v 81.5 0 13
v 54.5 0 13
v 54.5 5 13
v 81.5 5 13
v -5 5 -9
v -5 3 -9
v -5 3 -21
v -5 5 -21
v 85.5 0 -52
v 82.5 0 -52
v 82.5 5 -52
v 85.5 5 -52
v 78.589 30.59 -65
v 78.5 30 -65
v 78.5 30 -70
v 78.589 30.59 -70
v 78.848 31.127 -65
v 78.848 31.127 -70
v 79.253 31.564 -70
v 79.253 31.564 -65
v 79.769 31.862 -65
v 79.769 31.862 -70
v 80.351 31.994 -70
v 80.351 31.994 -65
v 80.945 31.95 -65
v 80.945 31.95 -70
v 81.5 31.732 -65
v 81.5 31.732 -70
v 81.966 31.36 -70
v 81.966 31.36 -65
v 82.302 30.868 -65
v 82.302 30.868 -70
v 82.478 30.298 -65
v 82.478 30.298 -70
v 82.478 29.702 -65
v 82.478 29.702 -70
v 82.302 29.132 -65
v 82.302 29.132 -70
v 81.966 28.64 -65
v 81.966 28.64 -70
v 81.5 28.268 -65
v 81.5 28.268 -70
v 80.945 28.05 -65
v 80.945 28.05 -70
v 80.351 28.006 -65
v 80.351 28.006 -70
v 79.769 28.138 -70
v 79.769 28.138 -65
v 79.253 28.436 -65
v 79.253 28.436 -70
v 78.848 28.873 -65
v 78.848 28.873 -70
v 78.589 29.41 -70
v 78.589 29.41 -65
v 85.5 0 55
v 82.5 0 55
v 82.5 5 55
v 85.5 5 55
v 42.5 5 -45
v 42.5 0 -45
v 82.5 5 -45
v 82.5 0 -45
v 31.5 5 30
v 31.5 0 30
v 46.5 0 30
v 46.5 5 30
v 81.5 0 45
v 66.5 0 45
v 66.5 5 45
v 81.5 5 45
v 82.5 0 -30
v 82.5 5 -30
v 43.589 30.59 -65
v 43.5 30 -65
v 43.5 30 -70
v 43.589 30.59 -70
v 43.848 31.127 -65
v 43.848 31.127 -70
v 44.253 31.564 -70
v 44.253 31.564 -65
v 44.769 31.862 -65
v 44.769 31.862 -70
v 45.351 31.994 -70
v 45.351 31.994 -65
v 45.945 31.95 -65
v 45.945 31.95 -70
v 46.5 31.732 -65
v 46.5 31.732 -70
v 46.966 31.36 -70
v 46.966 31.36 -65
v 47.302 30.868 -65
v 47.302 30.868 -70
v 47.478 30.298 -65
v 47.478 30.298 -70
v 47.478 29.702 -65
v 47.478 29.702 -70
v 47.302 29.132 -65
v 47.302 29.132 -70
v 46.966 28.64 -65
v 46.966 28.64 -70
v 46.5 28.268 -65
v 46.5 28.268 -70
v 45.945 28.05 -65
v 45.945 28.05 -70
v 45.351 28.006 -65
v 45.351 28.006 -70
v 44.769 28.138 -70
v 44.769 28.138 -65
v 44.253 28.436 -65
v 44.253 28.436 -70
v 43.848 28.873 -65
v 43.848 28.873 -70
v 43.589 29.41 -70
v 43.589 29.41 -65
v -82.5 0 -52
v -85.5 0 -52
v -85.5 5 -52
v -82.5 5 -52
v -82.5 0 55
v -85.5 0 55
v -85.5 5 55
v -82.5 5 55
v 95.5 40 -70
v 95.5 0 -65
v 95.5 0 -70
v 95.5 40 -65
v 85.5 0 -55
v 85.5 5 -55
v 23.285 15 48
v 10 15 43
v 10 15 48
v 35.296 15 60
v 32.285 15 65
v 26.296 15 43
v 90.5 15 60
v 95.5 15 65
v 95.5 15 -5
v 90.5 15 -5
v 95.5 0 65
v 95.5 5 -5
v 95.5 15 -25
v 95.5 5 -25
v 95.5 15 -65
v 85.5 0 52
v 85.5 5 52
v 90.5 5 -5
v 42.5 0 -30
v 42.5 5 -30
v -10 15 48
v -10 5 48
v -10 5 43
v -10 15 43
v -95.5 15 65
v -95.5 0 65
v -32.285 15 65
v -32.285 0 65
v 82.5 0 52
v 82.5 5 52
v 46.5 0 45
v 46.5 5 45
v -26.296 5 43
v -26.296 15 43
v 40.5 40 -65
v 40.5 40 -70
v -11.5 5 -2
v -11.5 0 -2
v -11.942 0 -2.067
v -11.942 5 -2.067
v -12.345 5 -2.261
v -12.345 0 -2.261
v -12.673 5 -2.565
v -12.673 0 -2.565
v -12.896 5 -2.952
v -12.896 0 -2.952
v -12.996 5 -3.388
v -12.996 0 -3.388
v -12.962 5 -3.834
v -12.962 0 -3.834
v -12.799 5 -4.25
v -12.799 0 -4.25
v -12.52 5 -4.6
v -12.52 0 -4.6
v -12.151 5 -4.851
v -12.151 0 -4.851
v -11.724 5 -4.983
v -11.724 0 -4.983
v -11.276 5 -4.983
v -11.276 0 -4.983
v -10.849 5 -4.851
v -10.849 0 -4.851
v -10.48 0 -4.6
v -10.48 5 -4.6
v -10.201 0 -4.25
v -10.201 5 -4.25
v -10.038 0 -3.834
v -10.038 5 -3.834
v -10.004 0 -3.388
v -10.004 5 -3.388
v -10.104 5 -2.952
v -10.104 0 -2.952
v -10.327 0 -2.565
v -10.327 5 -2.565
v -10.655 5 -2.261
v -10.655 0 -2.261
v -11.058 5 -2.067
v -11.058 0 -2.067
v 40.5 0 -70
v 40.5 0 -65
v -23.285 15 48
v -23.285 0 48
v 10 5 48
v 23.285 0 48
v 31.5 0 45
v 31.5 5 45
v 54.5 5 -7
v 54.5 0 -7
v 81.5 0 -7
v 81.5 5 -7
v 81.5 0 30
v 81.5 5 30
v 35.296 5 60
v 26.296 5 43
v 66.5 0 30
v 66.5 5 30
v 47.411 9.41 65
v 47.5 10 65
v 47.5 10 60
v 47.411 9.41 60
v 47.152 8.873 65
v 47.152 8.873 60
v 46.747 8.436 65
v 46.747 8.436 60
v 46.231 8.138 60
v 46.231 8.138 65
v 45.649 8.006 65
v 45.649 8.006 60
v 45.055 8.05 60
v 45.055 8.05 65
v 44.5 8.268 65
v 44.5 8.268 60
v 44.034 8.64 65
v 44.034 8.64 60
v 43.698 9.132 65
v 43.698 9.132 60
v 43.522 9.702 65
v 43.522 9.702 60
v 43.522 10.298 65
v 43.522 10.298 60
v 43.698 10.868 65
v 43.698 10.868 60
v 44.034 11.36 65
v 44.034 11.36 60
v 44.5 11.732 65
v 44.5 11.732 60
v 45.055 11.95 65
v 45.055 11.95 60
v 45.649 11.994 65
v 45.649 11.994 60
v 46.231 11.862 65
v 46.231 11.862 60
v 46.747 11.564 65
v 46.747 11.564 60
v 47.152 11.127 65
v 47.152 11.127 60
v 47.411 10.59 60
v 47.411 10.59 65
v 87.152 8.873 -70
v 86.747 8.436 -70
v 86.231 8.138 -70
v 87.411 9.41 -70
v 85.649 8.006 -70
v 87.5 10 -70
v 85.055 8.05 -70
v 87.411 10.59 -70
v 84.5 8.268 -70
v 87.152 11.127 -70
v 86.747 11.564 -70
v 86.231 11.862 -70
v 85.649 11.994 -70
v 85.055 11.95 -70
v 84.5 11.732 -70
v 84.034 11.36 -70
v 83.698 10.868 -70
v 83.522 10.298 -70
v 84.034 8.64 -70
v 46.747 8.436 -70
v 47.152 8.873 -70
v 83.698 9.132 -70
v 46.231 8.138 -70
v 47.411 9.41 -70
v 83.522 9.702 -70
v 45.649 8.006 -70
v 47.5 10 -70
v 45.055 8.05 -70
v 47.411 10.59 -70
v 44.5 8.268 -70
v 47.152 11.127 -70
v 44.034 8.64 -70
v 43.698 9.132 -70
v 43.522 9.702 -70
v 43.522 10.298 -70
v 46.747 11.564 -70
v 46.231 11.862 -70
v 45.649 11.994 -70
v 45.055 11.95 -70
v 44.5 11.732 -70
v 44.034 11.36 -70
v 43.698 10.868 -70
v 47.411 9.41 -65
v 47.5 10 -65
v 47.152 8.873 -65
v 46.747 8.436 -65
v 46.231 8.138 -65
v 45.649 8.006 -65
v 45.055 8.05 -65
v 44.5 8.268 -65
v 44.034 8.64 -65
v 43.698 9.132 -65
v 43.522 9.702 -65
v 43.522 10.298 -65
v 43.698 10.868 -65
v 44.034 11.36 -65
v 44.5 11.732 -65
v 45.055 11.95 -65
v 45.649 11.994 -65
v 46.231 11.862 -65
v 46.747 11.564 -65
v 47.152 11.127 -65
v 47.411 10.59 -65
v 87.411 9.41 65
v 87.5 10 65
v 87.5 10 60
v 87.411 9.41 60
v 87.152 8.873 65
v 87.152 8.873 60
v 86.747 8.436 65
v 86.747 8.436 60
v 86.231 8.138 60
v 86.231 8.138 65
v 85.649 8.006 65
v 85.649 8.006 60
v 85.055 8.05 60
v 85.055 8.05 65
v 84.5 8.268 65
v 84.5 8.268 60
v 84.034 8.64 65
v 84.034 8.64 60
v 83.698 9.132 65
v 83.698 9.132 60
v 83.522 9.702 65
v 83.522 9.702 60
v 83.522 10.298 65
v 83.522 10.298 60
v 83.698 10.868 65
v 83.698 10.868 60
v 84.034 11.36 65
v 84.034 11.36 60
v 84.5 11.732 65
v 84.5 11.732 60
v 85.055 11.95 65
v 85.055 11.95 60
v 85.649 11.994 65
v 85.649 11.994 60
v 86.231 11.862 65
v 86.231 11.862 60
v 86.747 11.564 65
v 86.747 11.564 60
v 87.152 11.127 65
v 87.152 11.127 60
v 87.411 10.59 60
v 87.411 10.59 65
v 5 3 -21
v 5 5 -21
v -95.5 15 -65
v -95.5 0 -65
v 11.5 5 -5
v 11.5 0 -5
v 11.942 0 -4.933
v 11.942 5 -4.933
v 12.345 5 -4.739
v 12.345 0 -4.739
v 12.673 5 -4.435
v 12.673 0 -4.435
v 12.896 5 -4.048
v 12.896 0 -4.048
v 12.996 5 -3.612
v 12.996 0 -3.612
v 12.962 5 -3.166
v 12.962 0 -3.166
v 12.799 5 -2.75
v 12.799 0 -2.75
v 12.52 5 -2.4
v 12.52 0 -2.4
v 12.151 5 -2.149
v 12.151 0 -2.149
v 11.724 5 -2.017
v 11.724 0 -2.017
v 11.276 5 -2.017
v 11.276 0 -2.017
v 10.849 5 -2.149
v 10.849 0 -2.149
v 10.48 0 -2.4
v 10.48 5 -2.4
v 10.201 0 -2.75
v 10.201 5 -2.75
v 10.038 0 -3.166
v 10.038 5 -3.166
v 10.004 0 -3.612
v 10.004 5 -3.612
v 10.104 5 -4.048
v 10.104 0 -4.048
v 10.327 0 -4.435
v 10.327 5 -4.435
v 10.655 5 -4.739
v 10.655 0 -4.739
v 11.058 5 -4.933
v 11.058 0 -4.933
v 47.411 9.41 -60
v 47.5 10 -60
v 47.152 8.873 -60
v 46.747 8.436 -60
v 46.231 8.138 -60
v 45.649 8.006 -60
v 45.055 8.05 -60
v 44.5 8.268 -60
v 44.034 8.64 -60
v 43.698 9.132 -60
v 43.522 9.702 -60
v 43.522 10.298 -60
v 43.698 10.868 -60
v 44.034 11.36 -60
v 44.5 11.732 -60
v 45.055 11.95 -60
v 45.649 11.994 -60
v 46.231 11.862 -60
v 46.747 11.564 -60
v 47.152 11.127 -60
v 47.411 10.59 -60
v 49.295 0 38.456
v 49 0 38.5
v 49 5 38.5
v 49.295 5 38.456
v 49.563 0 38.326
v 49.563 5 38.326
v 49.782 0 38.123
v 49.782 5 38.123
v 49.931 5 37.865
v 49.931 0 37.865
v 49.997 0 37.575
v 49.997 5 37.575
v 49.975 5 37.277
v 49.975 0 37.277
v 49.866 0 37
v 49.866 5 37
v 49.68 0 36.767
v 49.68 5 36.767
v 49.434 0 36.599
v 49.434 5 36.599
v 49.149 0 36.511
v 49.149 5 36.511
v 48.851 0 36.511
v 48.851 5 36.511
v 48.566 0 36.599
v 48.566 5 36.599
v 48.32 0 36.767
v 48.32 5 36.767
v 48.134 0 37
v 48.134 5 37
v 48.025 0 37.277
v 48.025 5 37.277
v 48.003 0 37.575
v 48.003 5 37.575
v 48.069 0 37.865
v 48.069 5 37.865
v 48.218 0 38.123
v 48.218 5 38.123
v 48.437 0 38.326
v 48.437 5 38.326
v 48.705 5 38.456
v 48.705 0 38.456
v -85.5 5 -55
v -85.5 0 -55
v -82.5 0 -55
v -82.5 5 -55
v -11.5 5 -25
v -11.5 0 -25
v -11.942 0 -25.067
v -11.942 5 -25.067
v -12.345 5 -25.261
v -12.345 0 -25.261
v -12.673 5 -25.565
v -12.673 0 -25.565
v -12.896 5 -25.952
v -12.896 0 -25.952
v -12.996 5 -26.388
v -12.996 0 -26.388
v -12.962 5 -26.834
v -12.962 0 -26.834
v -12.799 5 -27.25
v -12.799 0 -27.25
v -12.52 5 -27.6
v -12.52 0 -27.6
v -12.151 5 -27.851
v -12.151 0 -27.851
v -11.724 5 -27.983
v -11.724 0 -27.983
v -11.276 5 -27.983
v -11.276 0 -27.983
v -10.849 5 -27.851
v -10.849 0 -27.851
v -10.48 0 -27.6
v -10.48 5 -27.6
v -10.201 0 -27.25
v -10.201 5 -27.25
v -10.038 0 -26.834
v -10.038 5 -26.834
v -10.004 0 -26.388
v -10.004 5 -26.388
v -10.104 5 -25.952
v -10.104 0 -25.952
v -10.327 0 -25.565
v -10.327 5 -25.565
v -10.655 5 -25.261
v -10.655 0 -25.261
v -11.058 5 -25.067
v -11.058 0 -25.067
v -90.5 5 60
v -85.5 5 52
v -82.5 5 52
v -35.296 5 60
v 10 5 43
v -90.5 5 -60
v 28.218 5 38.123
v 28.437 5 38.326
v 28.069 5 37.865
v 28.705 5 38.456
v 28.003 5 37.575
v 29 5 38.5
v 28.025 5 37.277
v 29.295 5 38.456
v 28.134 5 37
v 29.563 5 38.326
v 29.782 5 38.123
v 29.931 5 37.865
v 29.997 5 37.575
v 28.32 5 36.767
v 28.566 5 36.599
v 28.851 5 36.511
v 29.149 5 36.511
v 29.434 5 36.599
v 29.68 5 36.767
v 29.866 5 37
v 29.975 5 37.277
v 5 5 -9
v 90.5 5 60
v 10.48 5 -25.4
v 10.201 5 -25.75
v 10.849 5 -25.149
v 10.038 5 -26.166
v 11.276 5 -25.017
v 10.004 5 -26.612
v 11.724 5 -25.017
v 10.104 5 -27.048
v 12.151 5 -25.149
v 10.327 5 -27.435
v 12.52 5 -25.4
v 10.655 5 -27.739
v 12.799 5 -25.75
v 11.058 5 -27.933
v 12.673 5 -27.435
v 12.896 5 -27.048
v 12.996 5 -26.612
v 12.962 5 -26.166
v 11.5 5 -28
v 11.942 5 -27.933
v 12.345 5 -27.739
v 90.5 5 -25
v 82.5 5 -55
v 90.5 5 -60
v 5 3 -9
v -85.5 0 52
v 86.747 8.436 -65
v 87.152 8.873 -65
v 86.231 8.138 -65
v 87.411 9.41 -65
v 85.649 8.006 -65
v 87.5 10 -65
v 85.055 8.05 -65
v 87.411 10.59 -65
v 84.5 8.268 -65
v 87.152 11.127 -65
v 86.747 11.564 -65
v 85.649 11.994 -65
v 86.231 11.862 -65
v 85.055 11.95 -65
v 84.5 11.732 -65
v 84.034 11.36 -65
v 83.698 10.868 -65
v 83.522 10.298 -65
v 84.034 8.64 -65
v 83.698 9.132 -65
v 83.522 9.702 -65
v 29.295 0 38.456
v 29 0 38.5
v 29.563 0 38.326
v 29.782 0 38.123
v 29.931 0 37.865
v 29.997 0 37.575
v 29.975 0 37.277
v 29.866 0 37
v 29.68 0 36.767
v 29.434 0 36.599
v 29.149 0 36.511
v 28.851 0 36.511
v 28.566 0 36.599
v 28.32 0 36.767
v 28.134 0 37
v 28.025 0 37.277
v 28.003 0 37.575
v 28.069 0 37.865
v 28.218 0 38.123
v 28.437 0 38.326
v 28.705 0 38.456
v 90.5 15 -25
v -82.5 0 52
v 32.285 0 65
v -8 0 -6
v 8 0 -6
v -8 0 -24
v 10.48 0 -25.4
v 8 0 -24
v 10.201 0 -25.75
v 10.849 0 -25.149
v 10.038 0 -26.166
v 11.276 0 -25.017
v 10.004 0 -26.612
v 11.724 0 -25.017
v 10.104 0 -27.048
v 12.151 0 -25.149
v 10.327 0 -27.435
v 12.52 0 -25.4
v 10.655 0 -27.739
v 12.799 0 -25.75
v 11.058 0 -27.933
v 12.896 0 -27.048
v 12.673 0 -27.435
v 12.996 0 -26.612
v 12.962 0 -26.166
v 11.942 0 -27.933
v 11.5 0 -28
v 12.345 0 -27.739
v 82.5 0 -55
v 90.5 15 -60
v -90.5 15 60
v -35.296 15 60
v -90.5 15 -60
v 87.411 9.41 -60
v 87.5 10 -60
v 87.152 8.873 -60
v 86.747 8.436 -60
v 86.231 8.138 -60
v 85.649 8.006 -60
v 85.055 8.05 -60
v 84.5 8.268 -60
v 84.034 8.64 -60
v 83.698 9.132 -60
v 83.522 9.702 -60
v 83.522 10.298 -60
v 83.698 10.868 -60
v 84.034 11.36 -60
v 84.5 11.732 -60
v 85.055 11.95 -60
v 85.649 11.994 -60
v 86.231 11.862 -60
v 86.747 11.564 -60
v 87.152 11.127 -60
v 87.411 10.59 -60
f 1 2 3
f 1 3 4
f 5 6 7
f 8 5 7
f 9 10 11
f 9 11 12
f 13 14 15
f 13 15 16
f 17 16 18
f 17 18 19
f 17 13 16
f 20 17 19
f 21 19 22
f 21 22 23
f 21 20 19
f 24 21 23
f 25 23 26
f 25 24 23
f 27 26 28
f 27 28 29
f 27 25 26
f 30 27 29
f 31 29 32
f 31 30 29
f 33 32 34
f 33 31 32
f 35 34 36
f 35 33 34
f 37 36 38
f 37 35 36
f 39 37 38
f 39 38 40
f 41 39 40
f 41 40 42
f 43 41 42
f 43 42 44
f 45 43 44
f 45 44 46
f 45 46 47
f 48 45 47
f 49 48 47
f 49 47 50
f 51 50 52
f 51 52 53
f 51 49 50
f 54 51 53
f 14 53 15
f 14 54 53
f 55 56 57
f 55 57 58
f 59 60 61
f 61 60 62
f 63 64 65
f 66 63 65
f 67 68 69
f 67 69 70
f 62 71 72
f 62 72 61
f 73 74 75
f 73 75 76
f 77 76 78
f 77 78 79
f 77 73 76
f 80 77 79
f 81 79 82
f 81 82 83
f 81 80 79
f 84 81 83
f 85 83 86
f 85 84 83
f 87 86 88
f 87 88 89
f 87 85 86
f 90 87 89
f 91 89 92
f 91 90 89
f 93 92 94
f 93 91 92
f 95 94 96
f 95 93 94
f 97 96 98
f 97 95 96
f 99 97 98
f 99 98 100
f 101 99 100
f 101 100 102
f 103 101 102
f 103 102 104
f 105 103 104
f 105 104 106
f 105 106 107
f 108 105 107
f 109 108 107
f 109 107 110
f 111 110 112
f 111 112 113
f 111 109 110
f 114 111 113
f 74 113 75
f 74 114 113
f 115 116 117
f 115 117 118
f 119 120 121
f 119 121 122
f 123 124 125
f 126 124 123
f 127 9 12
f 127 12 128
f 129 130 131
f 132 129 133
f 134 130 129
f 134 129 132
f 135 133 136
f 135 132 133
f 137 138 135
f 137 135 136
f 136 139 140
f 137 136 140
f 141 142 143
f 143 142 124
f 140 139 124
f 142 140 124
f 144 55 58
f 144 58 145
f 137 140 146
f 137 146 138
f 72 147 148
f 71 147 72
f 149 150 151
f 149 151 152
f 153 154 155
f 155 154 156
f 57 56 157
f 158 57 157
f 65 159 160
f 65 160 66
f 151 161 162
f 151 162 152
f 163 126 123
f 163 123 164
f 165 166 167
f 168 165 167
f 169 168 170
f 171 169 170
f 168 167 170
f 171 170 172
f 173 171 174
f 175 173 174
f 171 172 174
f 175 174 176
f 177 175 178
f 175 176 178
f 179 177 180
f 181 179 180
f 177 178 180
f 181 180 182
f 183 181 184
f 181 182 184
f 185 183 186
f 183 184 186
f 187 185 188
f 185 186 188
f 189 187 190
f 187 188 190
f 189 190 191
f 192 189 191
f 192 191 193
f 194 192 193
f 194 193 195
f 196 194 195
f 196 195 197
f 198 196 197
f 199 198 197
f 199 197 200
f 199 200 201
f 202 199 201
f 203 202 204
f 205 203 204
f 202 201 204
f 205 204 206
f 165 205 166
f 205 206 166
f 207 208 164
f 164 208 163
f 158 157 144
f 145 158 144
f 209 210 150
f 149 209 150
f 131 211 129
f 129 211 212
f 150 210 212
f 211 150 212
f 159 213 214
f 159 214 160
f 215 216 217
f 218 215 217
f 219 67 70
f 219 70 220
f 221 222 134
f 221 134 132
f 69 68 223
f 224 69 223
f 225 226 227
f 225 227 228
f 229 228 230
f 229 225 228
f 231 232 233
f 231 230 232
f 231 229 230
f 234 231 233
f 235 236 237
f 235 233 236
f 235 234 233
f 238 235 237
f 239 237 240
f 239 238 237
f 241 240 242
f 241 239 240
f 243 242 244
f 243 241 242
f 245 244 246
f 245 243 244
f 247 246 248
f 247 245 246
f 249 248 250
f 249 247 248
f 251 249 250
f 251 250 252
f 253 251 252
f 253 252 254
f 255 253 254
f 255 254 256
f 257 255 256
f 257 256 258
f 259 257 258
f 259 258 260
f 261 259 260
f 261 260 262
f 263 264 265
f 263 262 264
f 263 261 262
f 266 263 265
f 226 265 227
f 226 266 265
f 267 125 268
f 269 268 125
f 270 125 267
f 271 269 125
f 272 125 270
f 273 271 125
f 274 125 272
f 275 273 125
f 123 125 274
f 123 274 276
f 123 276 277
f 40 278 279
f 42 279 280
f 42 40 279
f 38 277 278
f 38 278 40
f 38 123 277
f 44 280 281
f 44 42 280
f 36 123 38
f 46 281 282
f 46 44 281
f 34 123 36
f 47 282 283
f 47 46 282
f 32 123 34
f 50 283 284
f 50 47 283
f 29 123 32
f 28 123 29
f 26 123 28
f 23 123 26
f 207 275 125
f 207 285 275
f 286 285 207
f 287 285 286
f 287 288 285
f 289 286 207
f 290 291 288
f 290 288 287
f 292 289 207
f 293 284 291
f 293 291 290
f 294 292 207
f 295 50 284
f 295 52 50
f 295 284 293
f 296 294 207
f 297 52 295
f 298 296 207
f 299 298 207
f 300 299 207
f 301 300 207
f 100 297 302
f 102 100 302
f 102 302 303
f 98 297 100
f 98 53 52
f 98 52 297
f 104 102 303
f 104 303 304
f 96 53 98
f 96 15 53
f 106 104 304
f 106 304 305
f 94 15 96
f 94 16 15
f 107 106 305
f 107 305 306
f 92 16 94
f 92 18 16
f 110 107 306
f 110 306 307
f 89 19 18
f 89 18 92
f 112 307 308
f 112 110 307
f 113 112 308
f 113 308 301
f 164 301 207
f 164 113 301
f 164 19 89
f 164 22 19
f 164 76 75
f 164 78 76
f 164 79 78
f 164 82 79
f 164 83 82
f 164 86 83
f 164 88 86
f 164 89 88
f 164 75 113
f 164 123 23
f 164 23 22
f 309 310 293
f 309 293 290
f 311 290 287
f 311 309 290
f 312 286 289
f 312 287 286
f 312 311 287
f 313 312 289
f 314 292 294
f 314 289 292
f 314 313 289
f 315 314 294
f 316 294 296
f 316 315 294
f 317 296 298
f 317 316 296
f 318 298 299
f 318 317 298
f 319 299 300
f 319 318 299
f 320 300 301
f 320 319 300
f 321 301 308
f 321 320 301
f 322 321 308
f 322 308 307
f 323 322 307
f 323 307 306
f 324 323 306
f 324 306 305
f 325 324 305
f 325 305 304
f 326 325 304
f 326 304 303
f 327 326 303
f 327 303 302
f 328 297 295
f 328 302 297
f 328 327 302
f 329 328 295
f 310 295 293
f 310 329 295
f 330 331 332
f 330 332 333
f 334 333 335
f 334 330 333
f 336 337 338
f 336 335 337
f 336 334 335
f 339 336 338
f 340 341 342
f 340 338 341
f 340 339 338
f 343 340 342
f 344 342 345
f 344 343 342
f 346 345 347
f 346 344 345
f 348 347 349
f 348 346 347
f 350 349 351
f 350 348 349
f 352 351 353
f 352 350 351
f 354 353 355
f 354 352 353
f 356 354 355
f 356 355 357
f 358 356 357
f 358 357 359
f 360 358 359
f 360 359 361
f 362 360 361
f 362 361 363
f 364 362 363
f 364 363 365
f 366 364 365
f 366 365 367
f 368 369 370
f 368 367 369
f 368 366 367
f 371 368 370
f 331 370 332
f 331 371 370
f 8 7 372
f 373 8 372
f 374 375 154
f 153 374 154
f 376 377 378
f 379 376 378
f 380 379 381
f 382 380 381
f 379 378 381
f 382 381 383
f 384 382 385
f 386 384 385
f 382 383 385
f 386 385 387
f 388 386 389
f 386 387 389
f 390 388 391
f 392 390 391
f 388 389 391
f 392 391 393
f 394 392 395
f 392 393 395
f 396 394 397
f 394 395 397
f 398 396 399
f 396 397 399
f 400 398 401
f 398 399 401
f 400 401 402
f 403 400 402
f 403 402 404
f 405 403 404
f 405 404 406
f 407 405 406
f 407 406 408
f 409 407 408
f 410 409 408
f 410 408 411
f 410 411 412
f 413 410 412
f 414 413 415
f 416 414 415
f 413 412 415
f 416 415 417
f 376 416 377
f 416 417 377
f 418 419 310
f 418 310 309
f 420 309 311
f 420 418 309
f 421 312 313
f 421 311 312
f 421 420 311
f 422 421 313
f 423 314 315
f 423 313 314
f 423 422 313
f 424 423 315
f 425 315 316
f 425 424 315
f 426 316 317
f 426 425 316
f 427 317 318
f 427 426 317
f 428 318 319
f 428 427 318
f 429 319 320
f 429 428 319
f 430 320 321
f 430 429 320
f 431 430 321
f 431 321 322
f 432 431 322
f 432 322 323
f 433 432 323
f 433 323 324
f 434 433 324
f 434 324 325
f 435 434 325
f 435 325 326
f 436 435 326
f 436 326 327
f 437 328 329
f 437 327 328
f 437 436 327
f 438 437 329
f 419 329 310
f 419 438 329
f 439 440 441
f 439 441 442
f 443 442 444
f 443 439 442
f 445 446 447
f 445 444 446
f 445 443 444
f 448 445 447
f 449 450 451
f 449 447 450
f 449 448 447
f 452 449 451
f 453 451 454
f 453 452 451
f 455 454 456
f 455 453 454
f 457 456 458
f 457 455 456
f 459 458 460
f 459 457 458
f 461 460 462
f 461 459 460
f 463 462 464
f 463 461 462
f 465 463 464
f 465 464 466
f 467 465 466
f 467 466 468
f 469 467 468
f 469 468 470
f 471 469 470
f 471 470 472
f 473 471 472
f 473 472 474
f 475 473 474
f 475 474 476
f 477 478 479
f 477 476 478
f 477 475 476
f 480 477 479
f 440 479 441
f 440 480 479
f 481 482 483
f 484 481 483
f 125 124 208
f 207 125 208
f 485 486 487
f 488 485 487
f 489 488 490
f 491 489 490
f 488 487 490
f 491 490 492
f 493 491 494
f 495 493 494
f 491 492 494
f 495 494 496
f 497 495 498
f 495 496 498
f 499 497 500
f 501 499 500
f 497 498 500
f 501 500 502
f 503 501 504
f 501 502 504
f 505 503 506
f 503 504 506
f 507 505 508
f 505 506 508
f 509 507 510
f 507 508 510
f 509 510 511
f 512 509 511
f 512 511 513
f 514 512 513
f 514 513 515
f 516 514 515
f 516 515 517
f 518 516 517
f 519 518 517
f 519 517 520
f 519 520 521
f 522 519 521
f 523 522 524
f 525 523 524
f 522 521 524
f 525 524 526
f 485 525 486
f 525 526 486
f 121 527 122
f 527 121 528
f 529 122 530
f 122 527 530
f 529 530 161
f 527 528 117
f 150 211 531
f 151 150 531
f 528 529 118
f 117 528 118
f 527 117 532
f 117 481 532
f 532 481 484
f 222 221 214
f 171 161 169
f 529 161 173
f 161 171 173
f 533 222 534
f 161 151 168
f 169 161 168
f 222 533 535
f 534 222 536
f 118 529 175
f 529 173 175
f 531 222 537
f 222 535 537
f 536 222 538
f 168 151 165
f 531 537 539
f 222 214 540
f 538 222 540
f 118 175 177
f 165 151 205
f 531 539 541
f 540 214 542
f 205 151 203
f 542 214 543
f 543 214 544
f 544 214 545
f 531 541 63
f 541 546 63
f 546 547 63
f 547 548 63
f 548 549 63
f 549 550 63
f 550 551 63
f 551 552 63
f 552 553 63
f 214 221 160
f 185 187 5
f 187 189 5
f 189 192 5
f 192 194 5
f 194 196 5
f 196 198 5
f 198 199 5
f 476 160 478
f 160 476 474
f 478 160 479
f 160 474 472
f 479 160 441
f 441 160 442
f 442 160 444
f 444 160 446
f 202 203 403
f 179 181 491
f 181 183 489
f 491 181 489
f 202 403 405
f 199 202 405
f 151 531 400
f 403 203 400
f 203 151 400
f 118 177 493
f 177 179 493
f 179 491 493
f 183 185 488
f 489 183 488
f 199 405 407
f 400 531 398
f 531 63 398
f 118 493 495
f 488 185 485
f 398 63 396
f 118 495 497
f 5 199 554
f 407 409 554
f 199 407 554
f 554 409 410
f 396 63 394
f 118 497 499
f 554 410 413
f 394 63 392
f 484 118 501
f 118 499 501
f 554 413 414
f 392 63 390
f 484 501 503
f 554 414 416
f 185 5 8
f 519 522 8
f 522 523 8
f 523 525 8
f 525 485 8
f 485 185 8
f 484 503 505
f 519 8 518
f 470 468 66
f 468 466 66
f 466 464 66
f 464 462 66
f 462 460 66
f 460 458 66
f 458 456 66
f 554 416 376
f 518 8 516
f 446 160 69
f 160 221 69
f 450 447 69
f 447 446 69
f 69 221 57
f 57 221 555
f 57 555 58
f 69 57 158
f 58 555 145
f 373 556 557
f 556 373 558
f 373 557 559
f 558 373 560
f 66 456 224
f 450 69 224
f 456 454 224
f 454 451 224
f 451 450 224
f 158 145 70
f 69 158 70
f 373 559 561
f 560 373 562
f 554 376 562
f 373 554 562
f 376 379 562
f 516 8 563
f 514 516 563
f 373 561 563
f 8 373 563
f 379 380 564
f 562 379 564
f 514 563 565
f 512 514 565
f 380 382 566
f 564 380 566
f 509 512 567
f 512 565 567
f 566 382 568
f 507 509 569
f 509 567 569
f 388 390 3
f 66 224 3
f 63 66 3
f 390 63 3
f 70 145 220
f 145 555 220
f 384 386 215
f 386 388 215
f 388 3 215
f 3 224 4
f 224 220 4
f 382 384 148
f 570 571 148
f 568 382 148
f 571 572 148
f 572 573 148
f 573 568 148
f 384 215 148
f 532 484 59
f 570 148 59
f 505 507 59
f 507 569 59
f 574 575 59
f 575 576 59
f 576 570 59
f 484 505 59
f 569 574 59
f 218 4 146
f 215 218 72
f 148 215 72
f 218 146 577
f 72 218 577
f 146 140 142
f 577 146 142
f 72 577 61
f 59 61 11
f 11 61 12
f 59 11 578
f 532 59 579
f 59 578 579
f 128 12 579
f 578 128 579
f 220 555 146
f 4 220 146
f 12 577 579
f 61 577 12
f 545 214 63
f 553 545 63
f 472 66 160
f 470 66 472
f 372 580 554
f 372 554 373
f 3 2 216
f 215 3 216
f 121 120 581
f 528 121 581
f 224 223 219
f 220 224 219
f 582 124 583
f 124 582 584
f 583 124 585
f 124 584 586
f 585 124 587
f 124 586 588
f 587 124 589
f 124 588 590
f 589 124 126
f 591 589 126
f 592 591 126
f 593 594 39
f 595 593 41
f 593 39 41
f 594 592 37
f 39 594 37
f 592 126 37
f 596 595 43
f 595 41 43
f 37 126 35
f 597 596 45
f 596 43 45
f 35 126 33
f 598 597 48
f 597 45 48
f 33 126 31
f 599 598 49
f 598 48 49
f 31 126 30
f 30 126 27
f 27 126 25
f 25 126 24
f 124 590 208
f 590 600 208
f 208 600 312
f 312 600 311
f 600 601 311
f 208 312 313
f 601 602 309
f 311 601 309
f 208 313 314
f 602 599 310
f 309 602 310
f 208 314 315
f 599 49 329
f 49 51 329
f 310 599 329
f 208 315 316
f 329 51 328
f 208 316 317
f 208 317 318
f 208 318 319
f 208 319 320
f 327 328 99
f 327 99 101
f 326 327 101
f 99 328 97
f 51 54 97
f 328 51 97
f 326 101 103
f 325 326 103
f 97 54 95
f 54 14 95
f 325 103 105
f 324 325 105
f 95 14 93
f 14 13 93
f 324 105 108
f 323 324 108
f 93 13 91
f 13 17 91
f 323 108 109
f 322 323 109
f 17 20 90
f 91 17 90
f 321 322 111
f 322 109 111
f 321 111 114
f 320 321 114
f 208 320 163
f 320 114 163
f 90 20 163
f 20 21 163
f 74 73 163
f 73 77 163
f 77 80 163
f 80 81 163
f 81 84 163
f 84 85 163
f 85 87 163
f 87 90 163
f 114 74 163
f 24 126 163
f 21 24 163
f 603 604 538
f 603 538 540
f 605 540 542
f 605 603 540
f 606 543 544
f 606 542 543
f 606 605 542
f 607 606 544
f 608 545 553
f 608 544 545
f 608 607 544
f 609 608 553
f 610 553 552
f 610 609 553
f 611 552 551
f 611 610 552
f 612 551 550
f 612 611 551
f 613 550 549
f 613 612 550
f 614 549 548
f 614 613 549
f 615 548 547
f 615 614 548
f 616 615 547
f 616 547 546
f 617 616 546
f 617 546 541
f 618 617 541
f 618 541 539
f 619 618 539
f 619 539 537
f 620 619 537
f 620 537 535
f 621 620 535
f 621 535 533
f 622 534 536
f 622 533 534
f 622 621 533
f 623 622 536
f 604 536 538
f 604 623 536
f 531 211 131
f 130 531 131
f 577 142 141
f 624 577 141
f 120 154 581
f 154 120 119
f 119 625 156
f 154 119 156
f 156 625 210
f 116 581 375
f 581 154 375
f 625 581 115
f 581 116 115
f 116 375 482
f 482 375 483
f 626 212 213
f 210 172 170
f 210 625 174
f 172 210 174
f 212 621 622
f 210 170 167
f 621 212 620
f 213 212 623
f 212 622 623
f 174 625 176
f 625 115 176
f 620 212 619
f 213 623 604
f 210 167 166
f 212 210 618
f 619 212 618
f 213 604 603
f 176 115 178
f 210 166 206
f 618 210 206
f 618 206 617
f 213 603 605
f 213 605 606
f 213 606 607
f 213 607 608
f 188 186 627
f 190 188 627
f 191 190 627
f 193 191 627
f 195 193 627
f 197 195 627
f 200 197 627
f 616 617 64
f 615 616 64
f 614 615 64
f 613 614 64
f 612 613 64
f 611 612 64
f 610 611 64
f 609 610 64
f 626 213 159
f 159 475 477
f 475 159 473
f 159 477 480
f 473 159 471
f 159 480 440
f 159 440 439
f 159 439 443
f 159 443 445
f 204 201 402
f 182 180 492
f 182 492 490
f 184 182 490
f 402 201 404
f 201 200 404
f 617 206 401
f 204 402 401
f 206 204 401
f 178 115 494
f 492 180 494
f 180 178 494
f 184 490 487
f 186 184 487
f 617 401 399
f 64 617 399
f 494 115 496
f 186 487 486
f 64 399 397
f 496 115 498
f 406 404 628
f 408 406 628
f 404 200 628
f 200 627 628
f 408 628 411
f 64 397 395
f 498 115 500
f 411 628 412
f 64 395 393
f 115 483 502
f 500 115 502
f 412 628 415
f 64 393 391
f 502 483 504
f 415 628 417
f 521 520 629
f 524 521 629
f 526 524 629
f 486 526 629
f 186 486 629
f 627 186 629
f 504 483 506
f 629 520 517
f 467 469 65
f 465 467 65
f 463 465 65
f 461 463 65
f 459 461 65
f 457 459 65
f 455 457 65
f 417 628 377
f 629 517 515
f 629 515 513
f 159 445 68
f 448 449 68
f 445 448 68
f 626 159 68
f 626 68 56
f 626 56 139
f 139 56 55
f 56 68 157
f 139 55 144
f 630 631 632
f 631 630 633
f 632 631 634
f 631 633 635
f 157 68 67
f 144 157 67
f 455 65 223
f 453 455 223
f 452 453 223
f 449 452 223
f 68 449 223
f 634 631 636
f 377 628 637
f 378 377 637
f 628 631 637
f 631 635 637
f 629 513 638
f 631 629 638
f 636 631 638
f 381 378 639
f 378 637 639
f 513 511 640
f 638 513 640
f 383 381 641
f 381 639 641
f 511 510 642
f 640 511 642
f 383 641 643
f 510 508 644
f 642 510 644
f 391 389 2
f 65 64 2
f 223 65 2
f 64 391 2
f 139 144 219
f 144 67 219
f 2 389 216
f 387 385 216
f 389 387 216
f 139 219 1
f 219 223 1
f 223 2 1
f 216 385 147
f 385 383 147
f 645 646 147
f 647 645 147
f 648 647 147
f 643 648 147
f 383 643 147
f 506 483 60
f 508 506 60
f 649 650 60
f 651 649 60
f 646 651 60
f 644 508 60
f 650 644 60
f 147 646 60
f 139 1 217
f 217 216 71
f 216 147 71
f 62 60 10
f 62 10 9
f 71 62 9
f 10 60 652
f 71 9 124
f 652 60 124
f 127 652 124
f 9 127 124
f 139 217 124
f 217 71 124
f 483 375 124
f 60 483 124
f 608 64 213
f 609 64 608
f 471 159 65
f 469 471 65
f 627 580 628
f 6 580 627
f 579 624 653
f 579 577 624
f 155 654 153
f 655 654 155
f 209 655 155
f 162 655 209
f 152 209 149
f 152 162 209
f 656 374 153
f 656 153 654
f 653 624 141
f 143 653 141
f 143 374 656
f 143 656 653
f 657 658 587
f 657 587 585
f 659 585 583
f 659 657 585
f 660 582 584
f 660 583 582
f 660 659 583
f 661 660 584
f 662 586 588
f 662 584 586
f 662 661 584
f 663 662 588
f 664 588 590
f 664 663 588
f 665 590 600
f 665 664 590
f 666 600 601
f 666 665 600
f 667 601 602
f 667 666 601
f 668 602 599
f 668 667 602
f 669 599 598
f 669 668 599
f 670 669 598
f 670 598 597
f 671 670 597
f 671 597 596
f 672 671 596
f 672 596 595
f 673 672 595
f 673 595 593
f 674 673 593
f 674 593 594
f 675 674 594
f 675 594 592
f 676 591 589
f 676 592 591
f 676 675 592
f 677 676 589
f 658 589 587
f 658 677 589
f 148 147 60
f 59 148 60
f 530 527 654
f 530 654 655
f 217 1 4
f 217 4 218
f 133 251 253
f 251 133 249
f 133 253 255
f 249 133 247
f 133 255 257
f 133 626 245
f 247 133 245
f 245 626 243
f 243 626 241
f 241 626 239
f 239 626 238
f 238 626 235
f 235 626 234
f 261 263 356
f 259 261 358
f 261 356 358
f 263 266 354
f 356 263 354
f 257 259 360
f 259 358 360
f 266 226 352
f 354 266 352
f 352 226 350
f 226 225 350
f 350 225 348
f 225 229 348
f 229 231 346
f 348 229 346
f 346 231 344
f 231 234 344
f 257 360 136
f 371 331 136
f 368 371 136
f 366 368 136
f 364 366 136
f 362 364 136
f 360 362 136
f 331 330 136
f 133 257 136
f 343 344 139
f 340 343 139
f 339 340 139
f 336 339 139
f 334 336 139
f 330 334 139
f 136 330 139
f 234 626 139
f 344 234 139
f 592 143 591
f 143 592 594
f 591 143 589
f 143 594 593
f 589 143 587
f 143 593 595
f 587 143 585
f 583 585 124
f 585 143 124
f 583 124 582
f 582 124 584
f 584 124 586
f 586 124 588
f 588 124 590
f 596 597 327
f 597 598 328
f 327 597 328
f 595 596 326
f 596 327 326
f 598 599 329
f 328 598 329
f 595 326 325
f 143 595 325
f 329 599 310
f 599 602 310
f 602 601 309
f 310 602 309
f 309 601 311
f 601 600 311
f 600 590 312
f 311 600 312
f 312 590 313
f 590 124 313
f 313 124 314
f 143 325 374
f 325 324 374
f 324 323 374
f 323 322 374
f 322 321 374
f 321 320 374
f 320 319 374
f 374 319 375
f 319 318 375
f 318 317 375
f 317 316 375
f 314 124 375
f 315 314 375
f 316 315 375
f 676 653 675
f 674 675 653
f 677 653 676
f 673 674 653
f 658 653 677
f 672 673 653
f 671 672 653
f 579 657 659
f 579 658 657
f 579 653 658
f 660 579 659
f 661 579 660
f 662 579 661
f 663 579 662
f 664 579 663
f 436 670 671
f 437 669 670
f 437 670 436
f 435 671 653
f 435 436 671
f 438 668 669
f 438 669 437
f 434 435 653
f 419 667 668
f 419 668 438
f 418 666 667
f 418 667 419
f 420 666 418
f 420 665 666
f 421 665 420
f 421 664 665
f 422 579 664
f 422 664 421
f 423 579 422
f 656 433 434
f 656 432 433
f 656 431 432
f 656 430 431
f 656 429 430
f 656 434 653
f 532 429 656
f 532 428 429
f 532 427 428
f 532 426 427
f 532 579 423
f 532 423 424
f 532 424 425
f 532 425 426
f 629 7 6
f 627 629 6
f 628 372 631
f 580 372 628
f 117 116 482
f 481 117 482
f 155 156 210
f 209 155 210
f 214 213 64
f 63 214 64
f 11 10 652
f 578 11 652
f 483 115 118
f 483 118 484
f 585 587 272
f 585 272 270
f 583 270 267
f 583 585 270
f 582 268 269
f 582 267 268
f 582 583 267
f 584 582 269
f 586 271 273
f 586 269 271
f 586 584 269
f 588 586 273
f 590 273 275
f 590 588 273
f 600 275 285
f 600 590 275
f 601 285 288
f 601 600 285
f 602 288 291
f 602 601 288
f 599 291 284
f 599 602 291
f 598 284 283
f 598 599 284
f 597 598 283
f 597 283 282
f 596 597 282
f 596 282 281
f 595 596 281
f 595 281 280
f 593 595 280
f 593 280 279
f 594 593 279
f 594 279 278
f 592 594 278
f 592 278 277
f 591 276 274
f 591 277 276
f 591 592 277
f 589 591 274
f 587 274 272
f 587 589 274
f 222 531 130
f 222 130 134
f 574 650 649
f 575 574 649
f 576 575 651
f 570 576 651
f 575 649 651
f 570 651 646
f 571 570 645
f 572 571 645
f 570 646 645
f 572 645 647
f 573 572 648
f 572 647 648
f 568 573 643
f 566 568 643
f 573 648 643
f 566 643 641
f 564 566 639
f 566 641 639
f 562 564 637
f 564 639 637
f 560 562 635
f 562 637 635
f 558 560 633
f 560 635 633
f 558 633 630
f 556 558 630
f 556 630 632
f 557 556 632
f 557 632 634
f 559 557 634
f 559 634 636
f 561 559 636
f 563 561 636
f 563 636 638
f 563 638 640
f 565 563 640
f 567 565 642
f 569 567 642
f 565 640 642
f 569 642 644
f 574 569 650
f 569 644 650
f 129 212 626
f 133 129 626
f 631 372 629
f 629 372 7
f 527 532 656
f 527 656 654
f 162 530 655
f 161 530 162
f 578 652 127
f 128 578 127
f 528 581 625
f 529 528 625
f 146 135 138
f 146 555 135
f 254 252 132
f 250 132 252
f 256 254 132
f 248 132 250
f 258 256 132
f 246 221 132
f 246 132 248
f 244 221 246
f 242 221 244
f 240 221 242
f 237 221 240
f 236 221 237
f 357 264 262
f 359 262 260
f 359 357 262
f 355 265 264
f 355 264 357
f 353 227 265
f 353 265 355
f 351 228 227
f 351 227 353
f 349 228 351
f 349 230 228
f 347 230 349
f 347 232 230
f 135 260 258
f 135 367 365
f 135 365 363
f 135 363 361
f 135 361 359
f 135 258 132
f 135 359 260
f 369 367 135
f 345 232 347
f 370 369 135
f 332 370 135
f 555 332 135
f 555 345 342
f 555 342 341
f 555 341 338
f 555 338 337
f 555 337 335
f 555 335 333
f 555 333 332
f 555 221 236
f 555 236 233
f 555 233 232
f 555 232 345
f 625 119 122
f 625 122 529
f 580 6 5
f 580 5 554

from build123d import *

# Parameters (mm, degrees)
BOSS_EXTRUDE2_DEPTH     = 15
SHELL1_T                = -5
CUT_EXTRUDE2_DEPTH      = 117.491415993
CUT_EXTRUDE2_DEPTH_BACK = 117.491415993
SKETCH4_R               = 1
SKETCH4_W               = 10
SKETCH4_H               = 12
SKETCH4_W_2             = 27
SKETCH4_H_2             = 20
SKETCH4_W_3             = 15
SKETCH4_H_3             = 15
SKETCH4_W_4             = 40
SKETCH5_W               = 3
SKETCH5_H               = 3
CUT_EXTRUDE4_DEPTH      = 117.491415993
SKETCH6_W               = 55
SKETCH6_H               = 40
SKETCH6_R               = 2
BOSS_EXTRUDE3_DEPTH     = 5
CUT_EXTRUDE5_DEPTH      = 171.133036181
CUT_EXTRUDE5_DEPTH_BACK = 171.133036181
SKETCH7_R               = 2
CHAMFER2_SIZE           = 3
SKETCH10_R              = 1.5
CUT_EXTRUDE6_DEPTH      = 5
SKETCH11_W              = 20
SKETCH11_H              = 10
CUT_EXTRUDE7_DEPTH      = 5
SKETCH12_W              = 20
SKETCH12_H              = 15
CUT_EXTRUDE8_DEPTH      = 6


with BuildPart() as part:
    # Sketch3 → Boss-Extrude2 (new body)
    with BuildSketch(Plane(origin=(0, 0, 0), x_dir=(1, 0, 0), z_dir=(0, 1, 0))):
        Polygon((95.5, 65), (-95.5, 65), (-95.5, -65), (-32.285430092, -65), (-23.285430092, -48), (23.285430092, -48), (32.285430092, -65), (95.5, -65), align=None)
    extrude(amount=BOSS_EXTRUDE2_DEPTH)

    # Shell1
    shell1_openings = [part.faces().sort_by_distance(p)[0] for p in [
        (0, 15, -2.252821678),
    ]]
    offset(amount=SHELL1_T, openings=shell1_openings, kind=Kind.INTERSECTION)

    # Sketch4 → Cut-Extrude2 (cut, two sides: drawn at the far end of the back side and taken through both)
    with BuildSketch(Plane(origin=(0, 0, 0), x_dir=(1, 0, 0), z_dir=(0, 1, 0)).offset(-CUT_EXTRUDE2_DEPTH_BACK)):
        with Locations((29, -37.5)):
            Circle(SKETCH4_R)
        with Locations((49, -37.5)):
            Circle(SKETCH4_R)
        with Locations((0, 15)):
            Rectangle(SKETCH4_W, SKETCH4_H)
        with Locations((68, -3)):
            Rectangle(SKETCH4_W_2, SKETCH4_H_2)
        with Locations((74, -37.5)):
            Rectangle(SKETCH4_W_3, SKETCH4_H_3)
        with Locations((39, -37.5)):
            Rectangle(SKETCH4_W_3, SKETCH4_H_3)
        with Locations((62.5, 37.5)):
            Rectangle(SKETCH4_W_4, SKETCH4_H_3)
    extrude(amount=CUT_EXTRUDE2_DEPTH + CUT_EXTRUDE2_DEPTH_BACK, mode=Mode.SUBTRACT)

    # Sketch5 → Cut-Extrude4 (cut, through all)
    with BuildSketch(Plane(origin=(0, 0, 0), x_dir=(1, 0, 0), z_dir=(0, 1, 0))):
        with Locations((-84, 53.5)):
            Rectangle(SKETCH5_W, SKETCH5_H)
        with Locations((84, 53.5)):
            Rectangle(SKETCH5_W, SKETCH5_H)
        with Locations((84, -53.5)):
            Rectangle(SKETCH5_W, SKETCH5_H)
        with Locations((-84, -53.5)):
            Rectangle(SKETCH5_W, SKETCH5_H)
    extrude(amount=CUT_EXTRUDE4_DEPTH, mode=Mode.SUBTRACT)


with BuildPart() as body_2:
    # Sketch6 → Boss-Extrude3 (new body)
    with BuildSketch(Plane(origin=(0, 0, -65), x_dir=(-1, 0, 0), z_dir=(0, 0, -1))):
        with Locations((-68, 20)):
            Rectangle(SKETCH6_W, SKETCH6_H)
        with Locations((-80.5, 30)):
            Circle(SKETCH6_R, mode=Mode.SUBTRACT)
        with Locations((-45.5, 30)):
            Circle(SKETCH6_R, mode=Mode.SUBTRACT)
    extrude(amount=BOSS_EXTRUDE3_DEPTH)


with BuildPart() as cut_extrude5_tool:
    # Sketch7 → Cut-Extrude5 (new, two sides: drawn at the far end of the back side and taken through both)
    with BuildSketch(Plane(origin=(0, 0, -70), x_dir=(-1, 0, 0), z_dir=(0, 0, -1)).offset(-CUT_EXTRUDE5_DEPTH_BACK)):
        with Locations((-85.5, 10)):
            Circle(SKETCH7_R)
        with Locations((-45.5, 10)):
            Circle(SKETCH7_R)
    extrude(amount=CUT_EXTRUDE5_DEPTH + CUT_EXTRUDE5_DEPTH_BACK)


with BuildPart() as part_1:
    add(part.part)

    # Cut-Extrude5: cut by cut_extrude5_tool
    add(cut_extrude5_tool.part, mode=Mode.SUBTRACT)

    # Chamfer2
    chamfer2_edges = [part_1.edges().sort_by_distance(p)[0] for p in [
        (0, 0, -21),
        (5, 0, -15),
        (0, 0, -9),
        (-5, 0, -15),
    ]]
    chamfer(chamfer2_edges, length=CHAMFER2_SIZE)

    # Sketch10 → Cut-Extrude6 (cut)
    with BuildSketch(Plane.XZ):
        with Locations((11.5, -3.5)):
            Circle(SKETCH10_R)
        with Locations((11.5, -26.5)):
            Circle(SKETCH10_R)
        with Locations((-11.5, -26.5)):
            Circle(SKETCH10_R)
        with Locations((-11.5, -3.5)):
            Circle(SKETCH10_R)
    extrude(amount=-CUT_EXTRUDE6_DEPTH, mode=Mode.SUBTRACT)

    # Sketch11 → Cut-Extrude7 (cut)
    with BuildSketch(Plane.XY.offset(48)):
        with Locations((0, 10)):
            Rectangle(SKETCH11_W, SKETCH11_H)
    extrude(amount=-CUT_EXTRUDE7_DEPTH, mode=Mode.SUBTRACT)

    # Sketch12 → Cut-Extrude8 (cut)
    with BuildSketch(Plane(origin=(95.5, 0, 0), x_dir=(0, 0, -1), z_dir=(1, 0, 0))):
        with Locations((15, 12.5)):
            Rectangle(SKETCH12_W, SKETCH12_H)
    extrude(amount=-CUT_EXTRUDE8_DEPTH, mode=Mode.SUBTRACT)


with BuildPart() as body_2_1:
    add(body_2.part)

    # Cut-Extrude5: cut by cut_extrude5_tool
    add(cut_extrude5_tool.part, mode=Mode.SUBTRACT)


solid = Compound([part_1.part, body_2_1.part])
